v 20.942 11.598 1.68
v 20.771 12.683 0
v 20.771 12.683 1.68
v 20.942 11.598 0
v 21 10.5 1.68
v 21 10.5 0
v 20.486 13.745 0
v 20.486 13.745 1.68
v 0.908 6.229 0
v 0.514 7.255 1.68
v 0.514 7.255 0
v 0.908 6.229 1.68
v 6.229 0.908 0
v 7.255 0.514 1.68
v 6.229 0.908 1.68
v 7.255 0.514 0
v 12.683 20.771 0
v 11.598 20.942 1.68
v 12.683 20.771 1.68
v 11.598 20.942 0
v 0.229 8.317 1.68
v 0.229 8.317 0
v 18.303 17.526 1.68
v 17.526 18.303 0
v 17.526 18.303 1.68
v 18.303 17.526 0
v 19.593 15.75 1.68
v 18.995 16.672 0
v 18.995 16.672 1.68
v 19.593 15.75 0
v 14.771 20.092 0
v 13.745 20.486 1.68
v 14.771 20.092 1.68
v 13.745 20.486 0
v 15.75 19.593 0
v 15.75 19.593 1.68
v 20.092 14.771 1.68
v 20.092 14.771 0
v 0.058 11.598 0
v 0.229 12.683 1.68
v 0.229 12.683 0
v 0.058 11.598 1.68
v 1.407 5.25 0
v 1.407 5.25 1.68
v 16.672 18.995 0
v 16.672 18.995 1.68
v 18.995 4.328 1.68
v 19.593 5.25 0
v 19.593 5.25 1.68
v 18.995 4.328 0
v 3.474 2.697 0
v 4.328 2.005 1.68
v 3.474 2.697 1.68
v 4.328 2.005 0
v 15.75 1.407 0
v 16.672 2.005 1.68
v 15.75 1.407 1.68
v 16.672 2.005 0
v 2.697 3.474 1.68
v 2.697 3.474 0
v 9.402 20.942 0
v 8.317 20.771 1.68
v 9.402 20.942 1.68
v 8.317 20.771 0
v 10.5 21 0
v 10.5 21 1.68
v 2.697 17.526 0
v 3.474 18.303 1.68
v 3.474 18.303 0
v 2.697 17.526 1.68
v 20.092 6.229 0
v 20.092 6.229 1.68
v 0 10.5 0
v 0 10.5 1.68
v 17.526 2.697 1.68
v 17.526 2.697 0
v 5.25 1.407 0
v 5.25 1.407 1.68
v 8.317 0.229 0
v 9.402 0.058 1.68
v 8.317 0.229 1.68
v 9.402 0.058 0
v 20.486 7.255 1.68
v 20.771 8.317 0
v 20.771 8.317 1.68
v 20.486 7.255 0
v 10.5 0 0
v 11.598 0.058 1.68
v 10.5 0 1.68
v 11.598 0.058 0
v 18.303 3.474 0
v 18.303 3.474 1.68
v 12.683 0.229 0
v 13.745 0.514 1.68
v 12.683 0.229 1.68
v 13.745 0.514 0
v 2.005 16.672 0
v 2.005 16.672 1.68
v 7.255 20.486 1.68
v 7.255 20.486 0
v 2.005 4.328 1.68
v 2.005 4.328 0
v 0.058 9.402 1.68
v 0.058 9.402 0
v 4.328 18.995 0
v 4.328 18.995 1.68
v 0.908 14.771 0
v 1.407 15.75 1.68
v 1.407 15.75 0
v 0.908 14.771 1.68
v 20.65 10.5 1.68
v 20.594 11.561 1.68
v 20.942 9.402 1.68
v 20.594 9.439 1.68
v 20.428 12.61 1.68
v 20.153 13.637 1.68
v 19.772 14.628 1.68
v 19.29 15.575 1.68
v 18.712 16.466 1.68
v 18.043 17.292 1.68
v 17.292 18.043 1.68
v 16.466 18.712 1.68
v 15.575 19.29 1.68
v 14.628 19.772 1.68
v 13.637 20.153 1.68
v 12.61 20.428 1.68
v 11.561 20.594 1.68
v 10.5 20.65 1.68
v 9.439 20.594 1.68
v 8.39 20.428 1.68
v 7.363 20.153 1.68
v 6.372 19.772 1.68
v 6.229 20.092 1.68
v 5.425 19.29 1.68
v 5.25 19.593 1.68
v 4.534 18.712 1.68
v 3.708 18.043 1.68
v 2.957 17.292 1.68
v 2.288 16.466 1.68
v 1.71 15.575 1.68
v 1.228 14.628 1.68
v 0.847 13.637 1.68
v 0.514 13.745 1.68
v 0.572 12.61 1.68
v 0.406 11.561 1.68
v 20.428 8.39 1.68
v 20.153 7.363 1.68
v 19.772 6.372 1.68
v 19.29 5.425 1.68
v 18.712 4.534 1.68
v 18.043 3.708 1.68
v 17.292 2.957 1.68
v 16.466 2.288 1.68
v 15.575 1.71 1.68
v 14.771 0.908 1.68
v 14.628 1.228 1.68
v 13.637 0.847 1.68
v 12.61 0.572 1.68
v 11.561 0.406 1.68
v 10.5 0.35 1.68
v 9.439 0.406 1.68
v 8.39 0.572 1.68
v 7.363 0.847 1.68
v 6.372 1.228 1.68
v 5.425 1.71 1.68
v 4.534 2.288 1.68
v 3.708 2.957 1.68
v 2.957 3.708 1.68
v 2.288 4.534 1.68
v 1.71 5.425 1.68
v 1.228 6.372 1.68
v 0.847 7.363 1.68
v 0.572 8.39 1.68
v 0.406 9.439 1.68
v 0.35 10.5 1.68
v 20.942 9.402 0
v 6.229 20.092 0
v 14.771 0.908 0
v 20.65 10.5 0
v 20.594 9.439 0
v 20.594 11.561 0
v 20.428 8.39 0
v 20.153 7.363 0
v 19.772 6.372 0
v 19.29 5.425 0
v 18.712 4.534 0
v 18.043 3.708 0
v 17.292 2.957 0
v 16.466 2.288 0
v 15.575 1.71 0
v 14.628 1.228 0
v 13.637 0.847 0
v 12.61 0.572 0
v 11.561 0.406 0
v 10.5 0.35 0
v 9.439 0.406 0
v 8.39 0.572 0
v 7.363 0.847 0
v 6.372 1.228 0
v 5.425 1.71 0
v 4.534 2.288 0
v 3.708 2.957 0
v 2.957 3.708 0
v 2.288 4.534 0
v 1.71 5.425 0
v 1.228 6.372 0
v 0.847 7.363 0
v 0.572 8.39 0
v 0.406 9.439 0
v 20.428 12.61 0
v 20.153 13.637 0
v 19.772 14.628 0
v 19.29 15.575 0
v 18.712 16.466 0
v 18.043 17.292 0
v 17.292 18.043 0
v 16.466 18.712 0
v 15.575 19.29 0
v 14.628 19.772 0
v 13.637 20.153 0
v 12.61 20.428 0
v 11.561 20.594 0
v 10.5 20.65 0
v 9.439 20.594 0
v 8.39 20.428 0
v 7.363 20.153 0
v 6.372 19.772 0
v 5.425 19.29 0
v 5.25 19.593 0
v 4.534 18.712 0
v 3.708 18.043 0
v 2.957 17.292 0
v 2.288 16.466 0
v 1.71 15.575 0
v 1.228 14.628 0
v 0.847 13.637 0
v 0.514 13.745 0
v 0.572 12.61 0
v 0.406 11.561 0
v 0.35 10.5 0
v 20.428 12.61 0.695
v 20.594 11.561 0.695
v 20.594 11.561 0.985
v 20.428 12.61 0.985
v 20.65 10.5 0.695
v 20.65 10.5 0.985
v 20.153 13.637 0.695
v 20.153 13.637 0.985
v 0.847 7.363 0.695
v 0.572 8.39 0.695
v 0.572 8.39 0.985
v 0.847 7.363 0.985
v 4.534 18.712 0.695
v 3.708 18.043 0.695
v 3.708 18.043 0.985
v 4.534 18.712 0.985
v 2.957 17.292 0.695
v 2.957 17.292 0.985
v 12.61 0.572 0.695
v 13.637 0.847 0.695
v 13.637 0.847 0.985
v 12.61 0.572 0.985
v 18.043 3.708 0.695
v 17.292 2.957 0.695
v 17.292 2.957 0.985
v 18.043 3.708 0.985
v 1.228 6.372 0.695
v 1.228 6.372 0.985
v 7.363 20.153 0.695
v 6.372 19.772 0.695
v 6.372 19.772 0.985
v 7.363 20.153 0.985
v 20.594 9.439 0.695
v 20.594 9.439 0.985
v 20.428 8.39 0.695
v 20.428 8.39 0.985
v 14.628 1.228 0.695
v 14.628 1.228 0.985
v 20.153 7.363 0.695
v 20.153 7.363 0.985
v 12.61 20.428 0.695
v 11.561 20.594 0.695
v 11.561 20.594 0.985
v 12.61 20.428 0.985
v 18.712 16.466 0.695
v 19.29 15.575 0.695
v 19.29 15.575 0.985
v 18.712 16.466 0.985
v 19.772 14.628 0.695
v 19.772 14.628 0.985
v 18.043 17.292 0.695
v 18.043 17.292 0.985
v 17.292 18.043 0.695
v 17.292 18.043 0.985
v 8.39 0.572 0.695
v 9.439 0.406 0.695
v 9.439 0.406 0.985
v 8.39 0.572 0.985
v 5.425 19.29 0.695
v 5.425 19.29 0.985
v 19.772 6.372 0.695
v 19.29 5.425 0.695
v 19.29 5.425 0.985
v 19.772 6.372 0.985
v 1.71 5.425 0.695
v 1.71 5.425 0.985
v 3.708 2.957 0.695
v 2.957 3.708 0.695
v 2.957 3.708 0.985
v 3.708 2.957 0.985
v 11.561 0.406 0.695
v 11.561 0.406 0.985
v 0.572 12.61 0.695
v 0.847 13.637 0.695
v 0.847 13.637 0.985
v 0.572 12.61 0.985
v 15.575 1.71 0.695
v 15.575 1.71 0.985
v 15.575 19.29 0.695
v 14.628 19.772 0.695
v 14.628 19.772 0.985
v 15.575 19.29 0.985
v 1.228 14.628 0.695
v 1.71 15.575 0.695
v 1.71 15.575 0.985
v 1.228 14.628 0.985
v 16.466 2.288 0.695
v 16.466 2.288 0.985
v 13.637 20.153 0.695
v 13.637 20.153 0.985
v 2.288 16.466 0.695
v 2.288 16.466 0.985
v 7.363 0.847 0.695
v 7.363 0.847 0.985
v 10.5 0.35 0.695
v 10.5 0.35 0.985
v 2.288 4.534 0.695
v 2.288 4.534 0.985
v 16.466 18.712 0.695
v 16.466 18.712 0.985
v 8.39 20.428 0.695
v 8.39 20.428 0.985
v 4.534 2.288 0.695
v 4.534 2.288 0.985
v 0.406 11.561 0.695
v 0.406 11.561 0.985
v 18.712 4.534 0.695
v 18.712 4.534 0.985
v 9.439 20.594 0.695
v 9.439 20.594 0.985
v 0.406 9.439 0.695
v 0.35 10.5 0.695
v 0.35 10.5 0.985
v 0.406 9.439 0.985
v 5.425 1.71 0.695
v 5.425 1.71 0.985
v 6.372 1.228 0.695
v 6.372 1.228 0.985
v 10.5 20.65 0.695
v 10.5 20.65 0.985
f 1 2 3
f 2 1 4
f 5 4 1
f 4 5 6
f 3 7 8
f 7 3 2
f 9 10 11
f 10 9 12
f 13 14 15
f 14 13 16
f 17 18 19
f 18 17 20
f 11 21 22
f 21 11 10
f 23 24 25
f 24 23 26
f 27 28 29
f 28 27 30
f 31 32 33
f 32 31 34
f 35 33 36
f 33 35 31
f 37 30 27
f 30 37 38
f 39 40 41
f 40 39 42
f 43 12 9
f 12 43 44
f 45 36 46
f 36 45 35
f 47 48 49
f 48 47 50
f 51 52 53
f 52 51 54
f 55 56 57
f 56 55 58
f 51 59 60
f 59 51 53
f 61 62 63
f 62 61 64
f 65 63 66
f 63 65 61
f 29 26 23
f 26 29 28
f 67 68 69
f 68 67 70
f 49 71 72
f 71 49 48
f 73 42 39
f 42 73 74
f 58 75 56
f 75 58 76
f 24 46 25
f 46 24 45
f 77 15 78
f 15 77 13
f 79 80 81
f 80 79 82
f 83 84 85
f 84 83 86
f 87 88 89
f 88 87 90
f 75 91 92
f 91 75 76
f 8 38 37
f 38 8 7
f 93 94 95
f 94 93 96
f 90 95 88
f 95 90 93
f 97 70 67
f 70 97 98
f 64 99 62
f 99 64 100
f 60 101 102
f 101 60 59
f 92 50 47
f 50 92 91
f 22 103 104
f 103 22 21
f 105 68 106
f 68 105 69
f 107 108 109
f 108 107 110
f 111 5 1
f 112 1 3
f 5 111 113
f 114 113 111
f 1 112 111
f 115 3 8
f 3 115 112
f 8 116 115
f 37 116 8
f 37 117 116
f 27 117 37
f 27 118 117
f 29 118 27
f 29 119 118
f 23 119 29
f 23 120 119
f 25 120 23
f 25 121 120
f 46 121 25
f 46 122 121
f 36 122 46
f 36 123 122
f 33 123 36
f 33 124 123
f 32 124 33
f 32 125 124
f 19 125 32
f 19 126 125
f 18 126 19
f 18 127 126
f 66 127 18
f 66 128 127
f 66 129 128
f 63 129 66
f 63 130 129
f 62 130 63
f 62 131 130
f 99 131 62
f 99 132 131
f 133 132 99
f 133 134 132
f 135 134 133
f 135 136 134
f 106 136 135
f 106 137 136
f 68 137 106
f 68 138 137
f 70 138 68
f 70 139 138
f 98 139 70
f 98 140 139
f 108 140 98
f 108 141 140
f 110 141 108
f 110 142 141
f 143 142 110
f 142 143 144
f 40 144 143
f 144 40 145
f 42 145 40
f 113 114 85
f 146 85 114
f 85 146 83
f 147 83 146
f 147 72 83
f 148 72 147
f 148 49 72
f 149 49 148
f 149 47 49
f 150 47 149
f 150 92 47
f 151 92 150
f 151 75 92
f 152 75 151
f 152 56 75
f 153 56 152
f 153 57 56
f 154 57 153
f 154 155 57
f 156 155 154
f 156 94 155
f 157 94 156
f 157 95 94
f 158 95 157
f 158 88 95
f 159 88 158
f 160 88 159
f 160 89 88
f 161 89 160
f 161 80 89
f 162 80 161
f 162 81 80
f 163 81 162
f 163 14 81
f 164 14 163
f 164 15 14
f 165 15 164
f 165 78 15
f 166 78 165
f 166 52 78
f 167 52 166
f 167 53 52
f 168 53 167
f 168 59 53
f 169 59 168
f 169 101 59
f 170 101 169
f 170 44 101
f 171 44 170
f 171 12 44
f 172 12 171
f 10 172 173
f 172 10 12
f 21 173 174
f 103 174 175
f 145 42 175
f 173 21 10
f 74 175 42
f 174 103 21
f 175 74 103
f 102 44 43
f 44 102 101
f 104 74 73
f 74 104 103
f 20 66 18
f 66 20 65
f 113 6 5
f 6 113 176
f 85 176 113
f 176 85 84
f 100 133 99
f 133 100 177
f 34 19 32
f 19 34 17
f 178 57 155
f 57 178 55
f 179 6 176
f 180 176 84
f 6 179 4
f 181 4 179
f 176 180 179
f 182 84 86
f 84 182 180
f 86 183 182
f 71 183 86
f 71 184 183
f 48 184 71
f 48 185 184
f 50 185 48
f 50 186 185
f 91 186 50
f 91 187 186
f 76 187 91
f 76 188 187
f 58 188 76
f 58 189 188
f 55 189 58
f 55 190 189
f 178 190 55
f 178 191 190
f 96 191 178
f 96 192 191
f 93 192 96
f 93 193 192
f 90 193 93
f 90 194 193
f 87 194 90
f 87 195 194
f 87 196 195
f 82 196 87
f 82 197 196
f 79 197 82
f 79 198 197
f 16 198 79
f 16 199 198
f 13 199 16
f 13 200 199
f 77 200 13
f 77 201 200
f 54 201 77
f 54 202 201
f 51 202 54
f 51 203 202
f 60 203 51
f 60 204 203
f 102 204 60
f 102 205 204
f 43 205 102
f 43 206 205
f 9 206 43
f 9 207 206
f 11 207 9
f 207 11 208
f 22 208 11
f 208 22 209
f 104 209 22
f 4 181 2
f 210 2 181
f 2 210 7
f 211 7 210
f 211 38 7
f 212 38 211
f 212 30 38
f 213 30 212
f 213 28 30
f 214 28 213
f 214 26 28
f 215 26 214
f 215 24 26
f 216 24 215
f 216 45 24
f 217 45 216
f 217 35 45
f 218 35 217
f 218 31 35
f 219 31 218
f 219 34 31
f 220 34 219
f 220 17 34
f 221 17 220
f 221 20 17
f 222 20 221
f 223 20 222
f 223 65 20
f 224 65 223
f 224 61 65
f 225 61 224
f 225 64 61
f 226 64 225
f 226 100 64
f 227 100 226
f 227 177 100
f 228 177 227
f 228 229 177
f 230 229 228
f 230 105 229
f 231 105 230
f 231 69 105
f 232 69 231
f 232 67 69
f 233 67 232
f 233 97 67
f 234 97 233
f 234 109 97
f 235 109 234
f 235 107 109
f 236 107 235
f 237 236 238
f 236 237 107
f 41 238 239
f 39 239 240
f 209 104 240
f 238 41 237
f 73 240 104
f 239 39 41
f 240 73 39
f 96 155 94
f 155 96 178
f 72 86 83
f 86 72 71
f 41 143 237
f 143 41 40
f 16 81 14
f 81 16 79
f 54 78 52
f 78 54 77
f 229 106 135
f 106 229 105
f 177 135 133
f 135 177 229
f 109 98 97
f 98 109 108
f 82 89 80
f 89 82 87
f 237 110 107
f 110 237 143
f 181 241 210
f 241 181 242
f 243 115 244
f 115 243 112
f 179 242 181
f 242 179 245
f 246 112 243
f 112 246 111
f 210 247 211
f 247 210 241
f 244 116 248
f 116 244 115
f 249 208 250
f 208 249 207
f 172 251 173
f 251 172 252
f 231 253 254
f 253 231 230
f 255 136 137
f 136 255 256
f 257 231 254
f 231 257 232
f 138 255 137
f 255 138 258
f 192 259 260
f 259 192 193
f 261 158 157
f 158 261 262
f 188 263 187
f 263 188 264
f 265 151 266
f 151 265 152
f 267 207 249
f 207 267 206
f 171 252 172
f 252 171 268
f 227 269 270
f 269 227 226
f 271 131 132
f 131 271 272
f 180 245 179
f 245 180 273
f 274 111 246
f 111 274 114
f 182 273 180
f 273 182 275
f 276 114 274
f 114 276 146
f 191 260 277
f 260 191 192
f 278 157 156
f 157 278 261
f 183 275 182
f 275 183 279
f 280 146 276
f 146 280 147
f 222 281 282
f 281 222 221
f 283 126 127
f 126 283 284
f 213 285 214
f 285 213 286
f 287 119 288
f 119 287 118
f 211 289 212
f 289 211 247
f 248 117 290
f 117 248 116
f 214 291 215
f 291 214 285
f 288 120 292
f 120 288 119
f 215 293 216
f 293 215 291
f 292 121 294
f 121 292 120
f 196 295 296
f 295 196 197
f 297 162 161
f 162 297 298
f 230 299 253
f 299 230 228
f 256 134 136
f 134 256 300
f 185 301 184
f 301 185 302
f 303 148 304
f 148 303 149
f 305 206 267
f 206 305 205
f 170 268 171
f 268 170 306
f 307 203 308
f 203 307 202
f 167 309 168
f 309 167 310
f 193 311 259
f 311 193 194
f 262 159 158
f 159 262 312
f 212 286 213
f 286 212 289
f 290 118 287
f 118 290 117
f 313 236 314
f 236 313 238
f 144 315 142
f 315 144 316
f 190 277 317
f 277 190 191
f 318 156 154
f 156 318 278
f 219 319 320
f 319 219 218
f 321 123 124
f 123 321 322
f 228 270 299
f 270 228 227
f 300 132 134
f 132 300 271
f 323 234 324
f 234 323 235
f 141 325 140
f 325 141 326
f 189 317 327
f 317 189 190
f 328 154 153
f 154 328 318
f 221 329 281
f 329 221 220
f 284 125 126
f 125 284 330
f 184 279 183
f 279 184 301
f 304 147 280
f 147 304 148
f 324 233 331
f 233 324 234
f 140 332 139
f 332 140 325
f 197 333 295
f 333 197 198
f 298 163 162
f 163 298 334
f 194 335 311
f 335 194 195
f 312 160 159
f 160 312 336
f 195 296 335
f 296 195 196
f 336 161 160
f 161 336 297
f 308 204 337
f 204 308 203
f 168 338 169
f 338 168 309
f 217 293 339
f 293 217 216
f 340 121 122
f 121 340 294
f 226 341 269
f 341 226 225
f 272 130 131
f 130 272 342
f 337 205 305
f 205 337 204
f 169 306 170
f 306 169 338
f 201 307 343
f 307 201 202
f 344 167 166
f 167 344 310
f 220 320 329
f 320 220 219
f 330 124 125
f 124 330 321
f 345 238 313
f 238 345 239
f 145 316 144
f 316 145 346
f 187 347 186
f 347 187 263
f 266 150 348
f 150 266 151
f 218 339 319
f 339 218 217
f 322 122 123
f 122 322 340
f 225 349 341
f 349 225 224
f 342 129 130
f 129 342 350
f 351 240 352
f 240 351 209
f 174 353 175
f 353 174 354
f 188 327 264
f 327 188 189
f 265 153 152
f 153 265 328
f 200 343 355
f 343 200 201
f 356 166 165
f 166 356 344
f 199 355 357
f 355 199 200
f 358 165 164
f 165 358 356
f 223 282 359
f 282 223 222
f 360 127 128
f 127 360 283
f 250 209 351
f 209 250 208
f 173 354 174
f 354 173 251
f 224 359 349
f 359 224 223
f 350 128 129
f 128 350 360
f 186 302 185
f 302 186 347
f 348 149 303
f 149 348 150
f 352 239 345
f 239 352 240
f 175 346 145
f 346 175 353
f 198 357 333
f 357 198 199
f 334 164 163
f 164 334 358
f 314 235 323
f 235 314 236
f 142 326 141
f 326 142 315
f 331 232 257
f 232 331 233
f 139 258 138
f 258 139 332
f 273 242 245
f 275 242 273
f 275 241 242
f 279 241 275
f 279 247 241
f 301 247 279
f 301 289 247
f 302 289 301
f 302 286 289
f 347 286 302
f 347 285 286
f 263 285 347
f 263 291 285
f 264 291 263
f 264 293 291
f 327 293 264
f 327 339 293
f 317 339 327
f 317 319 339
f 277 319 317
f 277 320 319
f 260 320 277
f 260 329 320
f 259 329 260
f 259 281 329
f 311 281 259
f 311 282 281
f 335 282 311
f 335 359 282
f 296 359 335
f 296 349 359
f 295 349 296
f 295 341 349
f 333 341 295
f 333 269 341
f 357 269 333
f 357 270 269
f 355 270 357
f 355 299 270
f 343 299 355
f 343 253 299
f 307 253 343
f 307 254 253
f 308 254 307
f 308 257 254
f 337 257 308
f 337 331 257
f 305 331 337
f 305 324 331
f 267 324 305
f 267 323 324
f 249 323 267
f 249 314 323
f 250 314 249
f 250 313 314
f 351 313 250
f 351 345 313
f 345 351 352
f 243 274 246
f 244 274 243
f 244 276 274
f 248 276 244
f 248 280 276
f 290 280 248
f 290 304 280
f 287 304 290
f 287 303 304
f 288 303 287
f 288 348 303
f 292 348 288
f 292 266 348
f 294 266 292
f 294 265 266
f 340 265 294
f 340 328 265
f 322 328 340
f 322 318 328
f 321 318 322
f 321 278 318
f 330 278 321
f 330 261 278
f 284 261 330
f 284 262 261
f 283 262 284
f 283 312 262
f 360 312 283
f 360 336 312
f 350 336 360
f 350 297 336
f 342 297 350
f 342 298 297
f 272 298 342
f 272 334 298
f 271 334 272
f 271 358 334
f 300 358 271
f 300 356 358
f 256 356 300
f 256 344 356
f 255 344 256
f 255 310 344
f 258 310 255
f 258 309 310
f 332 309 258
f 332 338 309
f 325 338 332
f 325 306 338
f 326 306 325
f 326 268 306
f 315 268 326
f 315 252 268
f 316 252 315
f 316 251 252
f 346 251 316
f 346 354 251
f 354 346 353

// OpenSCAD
/* [General] */
// coin diamter, in mm. Design at this size
diameter = 21;
// thickness of wall around the edge of the coin, in mm
edge_wall_thickness = 0.35;
// printer's layer height, in mm
layer_height = 0.06;

// bas releif depth, in layers
profile_depth_layers = 12;
// center thickness, in layers
base_thickness_layers = 4;

/* [Coin Elements - Bust] */
// (relative) path to bust image. Assumed to be square dimensions.
bust_image = "0033B Daniel Sou Noir/Profile A - 300px - 20241027.png";
// size, in pixels, of bust image
bust_pixels = 300;
bust_rotate = 0;
bust_delta_x = 0;
bust_delta_y = 0;

/* [Coin Elements - Name] */
name_image = "0033B Daniel Sou Noir/Name A - Daniel - 20241027.png";
name_pixels = 300;
name_rotate = 335;
name_delta_x = +0.6;
name_delta_y = 0;

/* [Coin Elements - Year] */
year_image = "0033B Daniel Sou Noir/Year A - 2024 - 20241027.png";
year_pixels = 300;
year_rotate = 315;
year_delta_x = 0;
year_delta_y = 0;

/* [Coin Elements - Value] */
value_image = "0033B Daniel Sou Noir/Value A - sou noir - 20241027.png";
value_pixels = 300;
value_rotate = 0;
value_delta_x = 0;
value_delta_y = 0;


/* [Coin Elements - Reverse] */
reverse_image = "0033B Daniel Sou Noir/Reverse A - Pegasus - 20241027.png";
reverse_pixels = 300;
reverse_rotate = 0;
reverse_delta_x = 0;
reverse_delta_y = 0;


/* [Rendering] */
cylinder_faces = 60;

/* [Testing] */
test_sizes = [16, 17, 18, 19, 21, 23, 24, 25, 27, 28, 31, 32, 38, 40];
tests = "no";  // ["yes", "no"]
// offset tests my this, should be greater than largest test size, in mm
test_offset = 42;


//  Create coin

// convert from layers to mm
profile_depth = profile_depth_layers * layer_height;
base_thickness = base_thickness_layers * layer_height;

module face_side(
    coin_diameter,
    delta_x = 0,
    delta_y = 0,
    base_thickness = 0.1,
    add_base = false,
    add_rim = false,
    add_face = true,
    add_name = true
) {
    master_scale = coin_diameter / diameter;
    bust_xy_scale = coin_diameter / bust_pixels;
    name_xy_scale = coin_diameter / name_pixels;
    z_scale = profile_depth / 100;
    
    // face "base"
    if (add_base) {
        color("red")
        translate(v = [
            coin_diameter / 2 + delta_x,
            coin_diameter / 2 + delta_y,
            -1 * base_thickness
        ])
        cylinder(h = base_thickness, r = coin_diameter / 2);
    }

    if (add_face) {
        // bust profile
        translate(v = [
            coin_diameter / 2 + bust_delta_x * master_scale + delta_x,
            coin_diameter / 2 + bust_delta_y * master_scale + delta_y,
            base_thickness
        ]) 
        scale(v = [bust_xy_scale, bust_xy_scale, z_scale])
            surface(file=bust_image, center=true);
    }

    if (add_name) {
        // name profile
        translate(v = [
            coin_diameter / 2 + name_delta_x * master_scale + delta_x,
            coin_diameter / 2 + name_delta_y * master_scale + delta_y,
            base_thickness
        ])
        rotate(a = name_rotate)
        scale(v = [name_xy_scale, name_xy_scale, z_scale])
            surface(file=name_image, center=true);
    }

    if (add_rim) {
        // edge wall
        color("blue")
        // translate(v = [coin_diameter / 2 + x, coin_diameter / 2 + y, base_thickness])
        difference(convexity=3) {
            translate(v = [
                coin_diameter / 2 + delta_x,
                coin_diameter / 2 + delta_y,
                base_thickness
            ])
            cylinder(
                h = profile_depth,
                r = coin_diameter / 2,
                $fn=cylinder_faces
            );

            translate(v = [
                coin_diameter / 2 + delta_x,
                coin_diameter / 2 + delta_y,
                base_thickness - 1
            ])
            cylinder(
                h = profile_depth + 2,
                r = coin_diameter / 2 - edge_wall_thickness,
                $fn=cylinder_faces
            );
        }
    }
}

module tails_side(    coin_diameter,
    delta_x = 0,
    delta_y = 0,
    base_thickness = 0.1,
    add_base = false,
    add_rim = false,
    add_reverse = true,
    add_year = true,
    add_value = true
) {
    master_scale = coin_diameter / diameter;
    reverse_xy_scale = coin_diameter / reverse_pixels;
    year_xy_scale = coin_diameter / year_pixels;
    value_xy_scale = coin_diameter / value_pixels;
    z_scale = profile_depth / 100;

    // face "base"
    if (add_base) {
        color("red")
        translate(v = [
            coin_diameter / 2 + delta_x,
            coin_diameter / 2 + delta_y,
            profile_depth
        ])
        cylinder(h = base_thickness, r = coin_diameter / 2);
    }

    if (add_reverse) {
        translate(v = [
            coin_diameter / 2 + reverse_delta_x * master_scale + delta_x,
            coin_diameter / 2 + reverse_delta_y * master_scale + delta_y,
            profile_depth
        ])
        rotate(a = reverse_rotate)
        rotate([0, 180, 0])
        scale(v = [reverse_xy_scale, reverse_xy_scale, z_scale])
            surface(file=reverse_image, center=true);
    }

    if (add_year) {
        translate(v = [
            coin_diameter / 2 + year_delta_x * master_scale + delta_x,
            coin_diameter / 2 + year_delta_y * master_scale + delta_y,
            profile_depth
        ])
        rotate(a = year_rotate)
        rotate([0, 180, 0])
        scale(v = [year_xy_scale, year_xy_scale, z_scale])
            surface(file=year_image, center=true);
    }

    if (add_value) {
        translate(v = [
            coin_diameter / 2 + value_delta_x * master_scale + delta_x,
            coin_diameter / 2 + value_delta_y * master_scale + delta_y,
            profile_depth
        ])
        rotate(a = value_rotate)
        rotate([0, 180, 0])
        scale(v = [value_xy_scale, value_xy_scale, z_scale])
            surface(file=value_image, center=true);
    }


    if (add_rim) {
        // edge wall
        color("blue")
        // translate(v = [coin_diameter / 2 + x, coin_diameter / 2 + y, base_thickness])
        difference(convexity=3) {
            translate(v = [
                coin_diameter / 2 + delta_x,
                coin_diameter / 2 + delta_y,
                0
            ])
            cylinder(
                h = profile_depth,
                r = coin_diameter / 2,
                $fn=cylinder_faces
            );

            translate(v = [
                coin_diameter / 2 + delta_x,
                coin_diameter / 2 + delta_y,
                base_thickness - 1
            ])
            cylinder(
                h = profile_depth + 2,
                r = coin_diameter / 2 - edge_wall_thickness,
                $fn=cylinder_faces
            );
        }
    }
}


module rim_side (
    coin_diameter,
    delta_x = 0,
    delta_y = 0,
    add_rim = true
) {
    if (add_rim) {
        rim_height = profile_depth * 2 + base_thickness;

        // edge wall
        color("blue")
        difference() {
            translate(v = [
                coin_diameter / 2 + delta_x,
                coin_diameter / 2 + delta_y,
                0
            ])
            cylinder(
                h = rim_height,
                r = coin_diameter / 2,
                $fn=cylinder_faces
            );

            translate(v = [
                coin_diameter / 2 + delta_x,
                coin_diameter / 2 + delta_y,
                -1
            ])
            cylinder(
                h = rim_height + 2,
                r = coin_diameter / 2 - edge_wall_thickness,
                $fn=cylinder_faces
            );
        }
    }
}


if (tests == "yes") {
    echo("** Running tests! **");

    test_count = len(test_sizes) - 1;
    for (i = [0:test_count]) {
        test_size = test_sizes[i];
        test_intro_str = str(str(i), " : ", str(test_size));
        size_str = str(str(test_size), " mm");

        echo(test_intro_str);

        face_side(coin_diameter = test_size, delta_x = test_offset * i);
    }

} else {
    tails_side(coin_diameter = diameter);

    color("red")
    translate(v = [diameter/2, diameter/2, profile_depth - 0.025]) 
    cylinder(h = base_thickness + 0.025 * 2, r = diameter/2);

    translate(v = [0, 0, profile_depth + base_thickness]) 
    face_side(coin_diameter = diameter);

    rim_side(coin_diameter = diameter);
}
